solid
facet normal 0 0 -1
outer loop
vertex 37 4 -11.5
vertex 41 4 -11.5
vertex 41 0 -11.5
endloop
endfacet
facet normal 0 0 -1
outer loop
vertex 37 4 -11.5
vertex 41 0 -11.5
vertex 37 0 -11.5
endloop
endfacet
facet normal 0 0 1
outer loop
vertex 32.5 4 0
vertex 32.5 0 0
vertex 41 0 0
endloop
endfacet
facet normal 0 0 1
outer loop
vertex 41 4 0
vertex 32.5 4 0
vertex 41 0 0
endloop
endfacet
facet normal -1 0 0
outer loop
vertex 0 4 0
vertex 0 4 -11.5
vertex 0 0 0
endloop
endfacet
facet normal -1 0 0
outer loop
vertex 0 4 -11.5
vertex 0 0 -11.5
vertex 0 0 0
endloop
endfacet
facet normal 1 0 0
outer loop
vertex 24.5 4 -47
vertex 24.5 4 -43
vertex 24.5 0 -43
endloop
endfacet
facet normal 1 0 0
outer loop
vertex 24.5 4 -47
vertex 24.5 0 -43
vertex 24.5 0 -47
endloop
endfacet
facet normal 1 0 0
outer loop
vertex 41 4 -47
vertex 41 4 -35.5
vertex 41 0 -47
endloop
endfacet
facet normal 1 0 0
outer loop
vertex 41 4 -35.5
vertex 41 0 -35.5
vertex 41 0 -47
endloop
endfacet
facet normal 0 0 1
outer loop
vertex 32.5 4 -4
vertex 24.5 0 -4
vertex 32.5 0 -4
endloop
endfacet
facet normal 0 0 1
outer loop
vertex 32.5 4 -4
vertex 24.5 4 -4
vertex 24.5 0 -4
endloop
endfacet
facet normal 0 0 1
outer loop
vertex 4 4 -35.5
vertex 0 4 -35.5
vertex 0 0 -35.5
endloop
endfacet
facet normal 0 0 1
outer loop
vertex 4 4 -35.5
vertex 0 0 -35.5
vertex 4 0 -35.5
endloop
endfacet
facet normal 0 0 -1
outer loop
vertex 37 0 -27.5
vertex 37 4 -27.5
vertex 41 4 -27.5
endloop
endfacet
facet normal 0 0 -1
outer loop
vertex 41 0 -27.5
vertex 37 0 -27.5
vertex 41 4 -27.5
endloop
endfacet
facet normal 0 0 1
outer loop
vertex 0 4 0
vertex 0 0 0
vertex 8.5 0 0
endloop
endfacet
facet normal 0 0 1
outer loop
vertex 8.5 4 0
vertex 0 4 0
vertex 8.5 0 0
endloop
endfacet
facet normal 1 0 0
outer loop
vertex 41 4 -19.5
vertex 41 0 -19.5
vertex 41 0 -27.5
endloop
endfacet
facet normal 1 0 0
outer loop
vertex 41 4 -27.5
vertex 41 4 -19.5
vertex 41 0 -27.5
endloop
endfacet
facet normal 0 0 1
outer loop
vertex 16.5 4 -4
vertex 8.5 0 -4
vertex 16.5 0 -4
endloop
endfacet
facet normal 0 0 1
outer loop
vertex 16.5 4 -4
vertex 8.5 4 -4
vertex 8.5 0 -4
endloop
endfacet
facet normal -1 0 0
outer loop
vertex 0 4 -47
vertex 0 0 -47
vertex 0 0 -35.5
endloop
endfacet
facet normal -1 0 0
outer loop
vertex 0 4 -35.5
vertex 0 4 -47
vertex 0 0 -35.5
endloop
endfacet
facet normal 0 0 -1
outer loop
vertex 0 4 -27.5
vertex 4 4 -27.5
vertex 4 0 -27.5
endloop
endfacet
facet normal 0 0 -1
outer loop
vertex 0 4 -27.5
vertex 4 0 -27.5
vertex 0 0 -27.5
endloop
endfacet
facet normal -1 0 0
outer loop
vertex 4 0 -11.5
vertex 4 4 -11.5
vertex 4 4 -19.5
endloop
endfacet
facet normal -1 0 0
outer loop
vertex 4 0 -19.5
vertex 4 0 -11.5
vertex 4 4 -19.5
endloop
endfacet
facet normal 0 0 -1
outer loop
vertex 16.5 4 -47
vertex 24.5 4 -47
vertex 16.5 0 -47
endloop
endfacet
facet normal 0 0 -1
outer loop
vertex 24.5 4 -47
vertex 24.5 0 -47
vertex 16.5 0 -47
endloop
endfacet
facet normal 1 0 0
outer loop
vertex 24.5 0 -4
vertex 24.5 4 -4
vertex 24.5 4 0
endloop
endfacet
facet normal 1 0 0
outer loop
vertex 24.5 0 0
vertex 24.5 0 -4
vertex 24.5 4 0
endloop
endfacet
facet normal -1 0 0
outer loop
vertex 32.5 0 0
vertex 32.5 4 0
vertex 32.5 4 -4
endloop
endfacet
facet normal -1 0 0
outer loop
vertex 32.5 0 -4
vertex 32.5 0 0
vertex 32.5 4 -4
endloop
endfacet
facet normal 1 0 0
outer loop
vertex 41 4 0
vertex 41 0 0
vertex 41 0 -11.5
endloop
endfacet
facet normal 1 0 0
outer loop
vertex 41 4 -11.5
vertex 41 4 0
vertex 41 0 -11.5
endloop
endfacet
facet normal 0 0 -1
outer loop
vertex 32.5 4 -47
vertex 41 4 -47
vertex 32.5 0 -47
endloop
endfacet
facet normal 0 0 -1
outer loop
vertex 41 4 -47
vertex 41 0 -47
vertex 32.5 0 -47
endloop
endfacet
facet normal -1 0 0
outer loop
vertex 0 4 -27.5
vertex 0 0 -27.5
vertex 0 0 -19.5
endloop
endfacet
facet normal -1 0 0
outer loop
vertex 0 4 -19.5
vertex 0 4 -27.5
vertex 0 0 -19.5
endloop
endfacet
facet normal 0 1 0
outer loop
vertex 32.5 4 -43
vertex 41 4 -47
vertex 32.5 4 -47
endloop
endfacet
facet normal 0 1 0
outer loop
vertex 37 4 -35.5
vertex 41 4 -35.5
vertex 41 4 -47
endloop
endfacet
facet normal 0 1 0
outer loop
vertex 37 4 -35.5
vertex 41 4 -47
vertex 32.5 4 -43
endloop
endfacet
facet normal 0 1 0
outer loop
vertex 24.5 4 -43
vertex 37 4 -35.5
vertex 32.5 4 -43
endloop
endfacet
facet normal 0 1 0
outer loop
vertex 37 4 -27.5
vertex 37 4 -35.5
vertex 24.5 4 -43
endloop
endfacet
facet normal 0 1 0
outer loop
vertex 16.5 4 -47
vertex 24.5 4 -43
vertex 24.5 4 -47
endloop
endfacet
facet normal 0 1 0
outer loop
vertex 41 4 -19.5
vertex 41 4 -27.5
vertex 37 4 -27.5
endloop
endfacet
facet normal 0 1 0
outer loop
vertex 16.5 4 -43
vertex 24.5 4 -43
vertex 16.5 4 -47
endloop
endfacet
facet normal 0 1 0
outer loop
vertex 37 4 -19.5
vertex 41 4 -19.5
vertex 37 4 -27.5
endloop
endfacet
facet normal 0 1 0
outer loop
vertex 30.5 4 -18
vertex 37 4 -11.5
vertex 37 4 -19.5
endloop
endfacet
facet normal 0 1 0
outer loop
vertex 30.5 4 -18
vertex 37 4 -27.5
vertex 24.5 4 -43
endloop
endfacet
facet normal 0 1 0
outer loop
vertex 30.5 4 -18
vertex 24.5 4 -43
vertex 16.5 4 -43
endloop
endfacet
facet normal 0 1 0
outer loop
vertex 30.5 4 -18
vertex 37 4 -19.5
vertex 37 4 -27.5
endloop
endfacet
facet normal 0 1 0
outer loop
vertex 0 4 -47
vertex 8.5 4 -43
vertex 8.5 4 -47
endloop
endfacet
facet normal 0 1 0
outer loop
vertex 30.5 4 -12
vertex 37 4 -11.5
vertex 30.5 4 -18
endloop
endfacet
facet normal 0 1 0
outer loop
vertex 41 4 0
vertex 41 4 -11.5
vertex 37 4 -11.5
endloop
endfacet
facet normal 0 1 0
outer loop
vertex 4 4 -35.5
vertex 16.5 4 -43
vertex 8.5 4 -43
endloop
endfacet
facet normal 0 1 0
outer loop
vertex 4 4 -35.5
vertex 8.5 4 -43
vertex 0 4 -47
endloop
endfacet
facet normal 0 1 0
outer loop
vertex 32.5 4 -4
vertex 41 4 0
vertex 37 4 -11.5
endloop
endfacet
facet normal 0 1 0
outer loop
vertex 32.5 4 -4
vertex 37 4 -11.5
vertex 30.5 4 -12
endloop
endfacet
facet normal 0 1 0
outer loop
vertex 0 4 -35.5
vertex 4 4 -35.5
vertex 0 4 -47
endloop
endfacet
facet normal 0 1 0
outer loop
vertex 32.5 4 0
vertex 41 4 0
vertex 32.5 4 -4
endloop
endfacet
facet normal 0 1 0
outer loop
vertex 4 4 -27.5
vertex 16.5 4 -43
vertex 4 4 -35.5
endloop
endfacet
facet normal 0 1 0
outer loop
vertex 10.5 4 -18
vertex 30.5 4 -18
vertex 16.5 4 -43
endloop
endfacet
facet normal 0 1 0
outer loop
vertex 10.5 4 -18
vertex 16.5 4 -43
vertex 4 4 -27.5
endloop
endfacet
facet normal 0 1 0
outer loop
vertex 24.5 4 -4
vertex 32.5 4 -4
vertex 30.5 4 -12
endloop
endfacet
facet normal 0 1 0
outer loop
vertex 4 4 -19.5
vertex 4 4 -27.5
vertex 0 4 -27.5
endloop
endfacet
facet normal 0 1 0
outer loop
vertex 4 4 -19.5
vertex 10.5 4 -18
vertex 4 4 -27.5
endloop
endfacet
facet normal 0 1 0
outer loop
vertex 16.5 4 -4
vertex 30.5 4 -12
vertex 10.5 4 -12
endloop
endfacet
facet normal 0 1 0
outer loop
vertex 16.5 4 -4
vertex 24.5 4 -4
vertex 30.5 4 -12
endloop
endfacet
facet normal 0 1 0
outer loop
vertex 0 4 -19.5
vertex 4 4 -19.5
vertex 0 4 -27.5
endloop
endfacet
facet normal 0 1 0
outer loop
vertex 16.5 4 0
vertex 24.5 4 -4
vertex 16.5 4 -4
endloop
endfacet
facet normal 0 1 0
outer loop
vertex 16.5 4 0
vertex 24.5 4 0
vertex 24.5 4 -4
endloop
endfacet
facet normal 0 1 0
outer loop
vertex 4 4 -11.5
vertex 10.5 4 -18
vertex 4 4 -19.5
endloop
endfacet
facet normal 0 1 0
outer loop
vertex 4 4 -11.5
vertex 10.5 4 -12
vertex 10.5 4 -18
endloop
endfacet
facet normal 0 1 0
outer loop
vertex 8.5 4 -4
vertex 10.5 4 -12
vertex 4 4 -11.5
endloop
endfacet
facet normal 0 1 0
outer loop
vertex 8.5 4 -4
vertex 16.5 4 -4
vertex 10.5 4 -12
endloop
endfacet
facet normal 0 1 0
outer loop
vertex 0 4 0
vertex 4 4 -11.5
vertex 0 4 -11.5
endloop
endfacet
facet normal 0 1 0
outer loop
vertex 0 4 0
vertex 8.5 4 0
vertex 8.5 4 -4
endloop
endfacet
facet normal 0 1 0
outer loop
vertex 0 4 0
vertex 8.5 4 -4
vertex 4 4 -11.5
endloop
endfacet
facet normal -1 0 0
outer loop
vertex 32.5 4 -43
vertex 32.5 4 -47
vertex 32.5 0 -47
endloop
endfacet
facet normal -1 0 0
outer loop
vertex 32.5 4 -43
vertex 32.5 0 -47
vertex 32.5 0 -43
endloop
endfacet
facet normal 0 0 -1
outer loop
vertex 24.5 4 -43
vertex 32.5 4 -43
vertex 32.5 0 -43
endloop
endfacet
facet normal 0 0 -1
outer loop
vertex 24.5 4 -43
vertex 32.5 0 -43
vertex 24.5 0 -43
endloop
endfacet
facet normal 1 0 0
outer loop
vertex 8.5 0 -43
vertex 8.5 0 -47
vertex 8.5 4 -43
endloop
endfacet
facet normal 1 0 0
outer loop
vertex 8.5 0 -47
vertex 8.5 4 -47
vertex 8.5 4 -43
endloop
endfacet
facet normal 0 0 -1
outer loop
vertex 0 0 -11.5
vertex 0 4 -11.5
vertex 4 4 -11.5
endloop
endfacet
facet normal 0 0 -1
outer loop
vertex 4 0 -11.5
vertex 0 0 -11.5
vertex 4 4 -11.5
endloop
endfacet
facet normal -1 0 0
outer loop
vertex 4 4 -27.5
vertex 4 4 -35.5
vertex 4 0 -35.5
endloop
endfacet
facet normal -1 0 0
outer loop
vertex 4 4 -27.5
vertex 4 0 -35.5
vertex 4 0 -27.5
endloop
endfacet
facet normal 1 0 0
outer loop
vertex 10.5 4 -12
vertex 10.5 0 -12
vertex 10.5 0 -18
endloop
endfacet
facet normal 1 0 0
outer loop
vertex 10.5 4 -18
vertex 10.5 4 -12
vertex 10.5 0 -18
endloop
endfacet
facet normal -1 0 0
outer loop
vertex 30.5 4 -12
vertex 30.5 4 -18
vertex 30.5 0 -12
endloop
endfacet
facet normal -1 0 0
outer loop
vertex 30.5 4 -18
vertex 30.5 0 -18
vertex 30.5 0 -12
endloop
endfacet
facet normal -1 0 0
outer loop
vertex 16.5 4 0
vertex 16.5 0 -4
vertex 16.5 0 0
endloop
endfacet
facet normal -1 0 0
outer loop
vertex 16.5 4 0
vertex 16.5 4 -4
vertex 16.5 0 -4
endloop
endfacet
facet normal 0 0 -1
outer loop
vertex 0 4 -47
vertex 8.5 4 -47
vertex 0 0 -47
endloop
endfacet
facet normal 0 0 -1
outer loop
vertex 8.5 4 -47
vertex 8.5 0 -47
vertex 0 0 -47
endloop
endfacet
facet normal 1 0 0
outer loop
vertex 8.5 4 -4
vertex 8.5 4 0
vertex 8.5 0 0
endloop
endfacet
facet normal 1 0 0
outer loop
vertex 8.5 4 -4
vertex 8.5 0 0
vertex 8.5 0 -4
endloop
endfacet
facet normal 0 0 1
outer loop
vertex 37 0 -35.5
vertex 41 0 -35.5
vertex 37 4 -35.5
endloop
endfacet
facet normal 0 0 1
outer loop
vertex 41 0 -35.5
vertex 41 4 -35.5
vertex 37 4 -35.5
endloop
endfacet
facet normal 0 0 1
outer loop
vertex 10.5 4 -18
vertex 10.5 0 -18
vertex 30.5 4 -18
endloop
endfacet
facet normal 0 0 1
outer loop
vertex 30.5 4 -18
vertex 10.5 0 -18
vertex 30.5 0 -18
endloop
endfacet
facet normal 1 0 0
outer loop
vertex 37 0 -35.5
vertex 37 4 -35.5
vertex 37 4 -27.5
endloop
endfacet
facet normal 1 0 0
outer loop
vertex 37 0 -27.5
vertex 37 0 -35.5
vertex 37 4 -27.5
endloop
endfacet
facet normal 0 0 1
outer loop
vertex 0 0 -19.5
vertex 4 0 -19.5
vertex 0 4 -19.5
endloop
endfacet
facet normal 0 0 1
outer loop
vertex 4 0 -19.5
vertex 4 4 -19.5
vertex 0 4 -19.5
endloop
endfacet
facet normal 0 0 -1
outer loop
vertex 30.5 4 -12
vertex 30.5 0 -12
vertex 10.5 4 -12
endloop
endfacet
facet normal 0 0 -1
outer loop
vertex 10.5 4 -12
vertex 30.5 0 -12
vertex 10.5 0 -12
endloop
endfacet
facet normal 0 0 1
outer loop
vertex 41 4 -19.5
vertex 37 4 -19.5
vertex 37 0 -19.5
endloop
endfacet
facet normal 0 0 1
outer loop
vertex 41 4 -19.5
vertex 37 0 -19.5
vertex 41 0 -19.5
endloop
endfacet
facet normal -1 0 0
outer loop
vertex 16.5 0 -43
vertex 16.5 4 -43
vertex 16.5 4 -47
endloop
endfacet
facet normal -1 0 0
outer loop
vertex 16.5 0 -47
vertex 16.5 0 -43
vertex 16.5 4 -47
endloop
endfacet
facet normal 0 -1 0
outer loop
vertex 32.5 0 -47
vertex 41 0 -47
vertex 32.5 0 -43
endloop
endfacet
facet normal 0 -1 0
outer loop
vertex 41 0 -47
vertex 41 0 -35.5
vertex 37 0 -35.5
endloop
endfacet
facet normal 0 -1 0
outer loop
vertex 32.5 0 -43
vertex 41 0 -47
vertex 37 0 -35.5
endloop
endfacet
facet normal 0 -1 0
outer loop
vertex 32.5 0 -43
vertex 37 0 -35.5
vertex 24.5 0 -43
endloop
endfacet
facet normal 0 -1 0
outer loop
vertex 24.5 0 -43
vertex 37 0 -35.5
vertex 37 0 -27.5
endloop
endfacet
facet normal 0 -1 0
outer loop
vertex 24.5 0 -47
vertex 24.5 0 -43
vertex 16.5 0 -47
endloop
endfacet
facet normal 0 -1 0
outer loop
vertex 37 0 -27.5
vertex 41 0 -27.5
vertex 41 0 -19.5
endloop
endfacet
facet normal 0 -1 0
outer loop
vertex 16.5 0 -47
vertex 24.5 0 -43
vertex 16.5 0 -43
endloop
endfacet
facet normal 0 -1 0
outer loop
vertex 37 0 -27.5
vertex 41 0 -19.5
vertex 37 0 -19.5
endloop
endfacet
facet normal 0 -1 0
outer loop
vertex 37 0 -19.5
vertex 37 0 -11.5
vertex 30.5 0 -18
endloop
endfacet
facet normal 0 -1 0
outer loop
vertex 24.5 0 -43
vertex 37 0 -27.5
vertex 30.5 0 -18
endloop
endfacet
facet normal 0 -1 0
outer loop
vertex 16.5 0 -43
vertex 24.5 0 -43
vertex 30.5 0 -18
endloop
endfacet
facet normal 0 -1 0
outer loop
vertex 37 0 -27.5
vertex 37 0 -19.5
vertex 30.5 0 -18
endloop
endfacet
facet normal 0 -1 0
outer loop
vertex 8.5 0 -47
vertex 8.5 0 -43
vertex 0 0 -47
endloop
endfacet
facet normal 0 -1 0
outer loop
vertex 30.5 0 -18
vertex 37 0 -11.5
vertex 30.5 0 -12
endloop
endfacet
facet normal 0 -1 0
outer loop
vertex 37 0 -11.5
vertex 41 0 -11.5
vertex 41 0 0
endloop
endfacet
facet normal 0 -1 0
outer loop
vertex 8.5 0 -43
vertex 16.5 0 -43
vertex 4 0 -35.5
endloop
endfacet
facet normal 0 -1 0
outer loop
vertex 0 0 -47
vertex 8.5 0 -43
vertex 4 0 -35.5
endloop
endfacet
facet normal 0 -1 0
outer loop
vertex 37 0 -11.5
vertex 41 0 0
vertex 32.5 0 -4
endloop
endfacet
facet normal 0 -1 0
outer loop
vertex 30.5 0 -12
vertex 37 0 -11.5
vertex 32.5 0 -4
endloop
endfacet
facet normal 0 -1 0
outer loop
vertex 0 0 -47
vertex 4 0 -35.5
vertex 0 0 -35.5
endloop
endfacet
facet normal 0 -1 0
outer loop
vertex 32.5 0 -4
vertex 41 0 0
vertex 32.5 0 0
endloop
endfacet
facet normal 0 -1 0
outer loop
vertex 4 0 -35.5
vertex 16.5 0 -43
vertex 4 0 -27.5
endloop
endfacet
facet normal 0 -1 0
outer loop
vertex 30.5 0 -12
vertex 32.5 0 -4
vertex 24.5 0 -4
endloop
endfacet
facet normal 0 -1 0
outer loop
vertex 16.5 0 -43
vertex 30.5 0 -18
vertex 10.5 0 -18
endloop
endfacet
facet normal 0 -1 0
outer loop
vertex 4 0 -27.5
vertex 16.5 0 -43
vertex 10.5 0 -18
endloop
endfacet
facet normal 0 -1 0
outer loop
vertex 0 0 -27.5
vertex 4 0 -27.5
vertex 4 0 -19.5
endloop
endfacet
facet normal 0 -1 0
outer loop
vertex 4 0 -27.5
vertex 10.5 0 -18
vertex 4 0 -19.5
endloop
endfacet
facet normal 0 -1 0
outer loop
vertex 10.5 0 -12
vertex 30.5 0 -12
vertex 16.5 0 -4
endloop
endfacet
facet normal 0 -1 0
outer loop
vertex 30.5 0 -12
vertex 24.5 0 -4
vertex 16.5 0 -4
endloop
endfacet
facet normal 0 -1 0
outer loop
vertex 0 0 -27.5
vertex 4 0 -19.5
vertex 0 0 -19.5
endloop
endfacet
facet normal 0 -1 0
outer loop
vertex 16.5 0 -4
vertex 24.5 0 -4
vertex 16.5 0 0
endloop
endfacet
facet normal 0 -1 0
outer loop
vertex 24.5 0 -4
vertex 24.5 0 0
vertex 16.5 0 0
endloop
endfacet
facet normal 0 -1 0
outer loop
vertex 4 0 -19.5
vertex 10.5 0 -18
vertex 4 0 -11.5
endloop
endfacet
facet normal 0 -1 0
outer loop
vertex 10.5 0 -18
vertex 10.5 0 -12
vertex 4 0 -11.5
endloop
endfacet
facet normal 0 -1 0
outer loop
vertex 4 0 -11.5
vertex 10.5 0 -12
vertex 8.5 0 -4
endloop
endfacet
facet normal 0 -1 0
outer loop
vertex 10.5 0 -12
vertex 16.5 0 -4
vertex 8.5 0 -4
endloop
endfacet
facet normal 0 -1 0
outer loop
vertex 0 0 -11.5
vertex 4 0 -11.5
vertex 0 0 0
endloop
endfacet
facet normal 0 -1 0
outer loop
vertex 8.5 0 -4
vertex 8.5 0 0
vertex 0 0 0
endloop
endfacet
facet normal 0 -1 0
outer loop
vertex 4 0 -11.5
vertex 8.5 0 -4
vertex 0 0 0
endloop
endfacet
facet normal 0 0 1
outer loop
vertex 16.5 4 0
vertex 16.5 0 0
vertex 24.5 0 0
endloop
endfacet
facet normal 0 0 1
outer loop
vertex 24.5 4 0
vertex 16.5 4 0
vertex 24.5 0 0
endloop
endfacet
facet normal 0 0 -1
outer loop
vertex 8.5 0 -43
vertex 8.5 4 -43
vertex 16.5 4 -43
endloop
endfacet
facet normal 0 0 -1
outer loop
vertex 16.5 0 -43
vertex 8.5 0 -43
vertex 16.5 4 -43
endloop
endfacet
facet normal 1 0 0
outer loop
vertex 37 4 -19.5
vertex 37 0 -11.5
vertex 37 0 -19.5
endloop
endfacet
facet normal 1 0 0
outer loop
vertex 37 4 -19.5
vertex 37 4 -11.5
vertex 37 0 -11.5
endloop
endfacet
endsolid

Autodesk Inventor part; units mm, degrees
ref_plane "YZ Plane" through (0, 0, 0) normal (1, 0, 0) x (0, 1, 0)
ref_plane "XZ Plane" through (0, 0, 0) normal (0, 1, 0) x (-1, 0, 0)
ref_plane "XY Plane" through (0, 0, 0) normal (0, 0, 1) x (1, 0, 0)
sketch "Sketch1" plane through (0, 0, 0) normal (0, 1, 0) x (-1, 0, 0)
  line L0 (0, 0) -> (-41, 0)
  line L1 (-41, 0) -> (-41, -47)
  line L2 (-41, -47) -> (0, -47)
  line L3 (0, -47) -> (0, 0)
  line L4 (-10.5, -18) -> (-30.5, -18)
  line L5 (-30.5, -18) -> (-30.5, -12)
  line L6 (-30.5, -12) -> (-10.5, -12)
  line L7 (-10.5, -12) -> (-10.5, -18)
  dimension "d0" = 41
  dimension "d1" = 47
  dimension "d2" = 20
  dimension "d3" = 6
  dimension "d4" = 10.5
  dimension "d5" = 12
extrude "Extrusion1" add sketch "Sketch1" along normal blind 4
sketch "Sketch2" plane through (0, 4, 0) normal (0, 1, 0) x (1, 0, 0)
  line L0 (41, 47) -> (0, 47) construction
  line L1 (0, 47) -> (0, 0) construction
  line L2 (0, 0) -> (41, 0) construction
  line L3 (41, 0) -> (41, 47) construction
  line L4 (4, 4) -> (4, 43) construction
  line L5 (4, 43) -> (37, 43) construction
  line L6 (37, 43) -> (37, 4) construction
  line L7 (37, 4) -> (4, 4) construction
  line L8 (0, 35.5) -> (4, 35.5)
  line L9 (4, 35.5) -> (4, 27.5)
  line L10 (4, 27.5) -> (0, 27.5)
  line L11 (0, 35.5) -> (0, 27.5)
  line L12 (0, 23.5) -> (41, 23.5) construction
  line L13 (20.5, 0) -> (20.5, 47) construction
  line L14 (41, 47) -> (0, 47) construction
  line L15 (8.5, 47) -> (8.5, 43)
  line L16 (8.5, 43) -> (16.5, 43)
  line L17 (16.5, 43) -> (16.5, 47)
  line L18 (16.5, 47) -> (8.5, 47)
  line L19 (41, 35.5) -> (37, 35.5)
  line L20 (37, 35.5) -> (37, 27.5)
  line L21 (37, 27.5) -> (41, 27.5)
  line L22 (41, 35.5) -> (41, 27.5)
  line L23 (32.5, 47) -> (32.5, 43)
  line L24 (32.5, 43) -> (24.5, 43)
  line L25 (24.5, 43) -> (24.5, 47)
  line L26 (24.5, 47) -> (32.5, 47)
  line L27 (41, 0) -> (0, 0)
  line L28 (4, 4) -> (37, 4)
  line L29 (0, 11.5) -> (4, 11.5)
  line L30 (4, 11.5) -> (4, 19.5)
  line L31 (4, 19.5) -> (0, 19.5)
  line L32 (0, 11.5) -> (0, 19.5)
  line L33 (41, 0) -> (0, 0)
  line L34 (8.5, 0) -> (8.5, 4)
  line L35 (8.5, 4) -> (16.5, 4)
  line L36 (16.5, 4) -> (16.5, 0)
  line L37 (16.5, 0) -> (8.5, 0)
  line L38 (24.5, 4) -> (24.5, 0)
  line L39 (32.5, 0) -> (32.5, 4)
  line L40 (37, 11.5) -> (37, 19.5)
  line L41 (41, 11.5) -> (37, 11.5)
  line L42 (41, 11.5) -> (41, 19.5)
  line L43 (37, 19.5) -> (41, 19.5)
  line L44 (24.5, 0) -> (32.5, 0)
  line L45 (32.5, 4) -> (24.5, 4)
  dimension "d8" = 4
  dimension "d9" = 8
  dimension "d10" = 4
  dimension "d11" = 8
  dimension "d12" = 4
extrude "Extrusion2" cut sketch "Sketch2" against normal up to surface (4 mm away) contours L8 L9 L10 L11 | L18 L17 L16 L15 | L22 L21 L20 L19 | L23 L24 L25 L26 | L27 L38 L28 L39 | L27 L34 L28 L36 | L32 L31 L30 L29 | L40 L43 L42 L41
properties part number "right" material "PBT Plastic Black"
